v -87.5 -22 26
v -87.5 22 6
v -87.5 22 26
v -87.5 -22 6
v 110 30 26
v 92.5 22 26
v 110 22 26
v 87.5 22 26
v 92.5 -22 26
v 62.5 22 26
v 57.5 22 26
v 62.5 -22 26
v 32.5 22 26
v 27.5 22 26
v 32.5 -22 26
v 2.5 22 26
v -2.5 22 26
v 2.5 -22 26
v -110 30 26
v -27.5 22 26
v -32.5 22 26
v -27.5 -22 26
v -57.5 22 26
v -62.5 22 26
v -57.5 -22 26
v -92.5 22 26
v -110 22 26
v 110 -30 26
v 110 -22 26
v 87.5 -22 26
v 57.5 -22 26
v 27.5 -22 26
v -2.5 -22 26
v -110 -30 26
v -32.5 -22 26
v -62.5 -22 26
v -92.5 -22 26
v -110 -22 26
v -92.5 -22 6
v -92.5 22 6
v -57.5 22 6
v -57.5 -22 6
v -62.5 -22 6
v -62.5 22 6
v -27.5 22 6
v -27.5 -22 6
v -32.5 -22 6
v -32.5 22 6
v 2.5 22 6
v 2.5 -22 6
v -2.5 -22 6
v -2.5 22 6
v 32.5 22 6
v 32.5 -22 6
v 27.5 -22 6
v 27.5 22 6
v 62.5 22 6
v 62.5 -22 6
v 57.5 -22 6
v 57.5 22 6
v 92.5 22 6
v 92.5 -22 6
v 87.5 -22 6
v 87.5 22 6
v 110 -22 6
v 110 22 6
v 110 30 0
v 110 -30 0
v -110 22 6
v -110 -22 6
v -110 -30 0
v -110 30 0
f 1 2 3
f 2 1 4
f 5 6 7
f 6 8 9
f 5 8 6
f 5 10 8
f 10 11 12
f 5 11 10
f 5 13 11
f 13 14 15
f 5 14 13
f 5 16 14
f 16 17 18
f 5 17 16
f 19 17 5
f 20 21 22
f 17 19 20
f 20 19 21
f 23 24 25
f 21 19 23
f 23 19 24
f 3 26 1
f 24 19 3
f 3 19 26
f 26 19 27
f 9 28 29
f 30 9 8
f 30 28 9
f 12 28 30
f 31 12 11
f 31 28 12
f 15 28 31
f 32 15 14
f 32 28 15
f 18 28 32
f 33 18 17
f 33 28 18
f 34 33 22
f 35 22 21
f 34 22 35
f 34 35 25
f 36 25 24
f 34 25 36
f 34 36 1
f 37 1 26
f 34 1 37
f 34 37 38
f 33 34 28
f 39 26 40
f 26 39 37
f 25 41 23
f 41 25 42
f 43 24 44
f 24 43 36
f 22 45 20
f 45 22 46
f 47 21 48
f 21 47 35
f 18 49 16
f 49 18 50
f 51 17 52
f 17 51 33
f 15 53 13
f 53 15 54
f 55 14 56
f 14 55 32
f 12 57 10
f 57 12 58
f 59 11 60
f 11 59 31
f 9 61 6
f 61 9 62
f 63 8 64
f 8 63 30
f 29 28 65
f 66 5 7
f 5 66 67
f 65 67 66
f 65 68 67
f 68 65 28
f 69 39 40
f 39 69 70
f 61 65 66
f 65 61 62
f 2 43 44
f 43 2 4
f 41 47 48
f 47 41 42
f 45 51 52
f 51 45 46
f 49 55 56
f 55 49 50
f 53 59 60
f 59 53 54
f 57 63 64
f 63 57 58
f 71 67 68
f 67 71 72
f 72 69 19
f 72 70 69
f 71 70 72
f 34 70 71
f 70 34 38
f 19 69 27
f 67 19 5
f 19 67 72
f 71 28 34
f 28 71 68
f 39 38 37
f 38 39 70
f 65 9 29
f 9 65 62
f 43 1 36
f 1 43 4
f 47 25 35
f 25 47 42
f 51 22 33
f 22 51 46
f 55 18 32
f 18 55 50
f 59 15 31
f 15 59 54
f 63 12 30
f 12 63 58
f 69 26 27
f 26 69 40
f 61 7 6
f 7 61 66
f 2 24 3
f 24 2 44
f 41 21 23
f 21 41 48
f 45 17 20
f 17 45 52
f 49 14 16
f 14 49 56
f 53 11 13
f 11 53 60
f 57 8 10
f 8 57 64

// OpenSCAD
$fn = 32;

// ----------------------------------------------------------------------
// Rib frame 220 x 60 x 26
// 7 ribs at 30 mm pitch
// ----------------------------------------------------------------------

// --- parameters (mm) ---
frame = [220, 60, 6];  // base plate size (x, y, z)
rail_w = 8;            // side rail width
ribs = 7;              // number of ribs
rib_t = 5;             // rib thickness
rib_h = 20;            // rib height above the base plate
pitch = 30;            // pitch between rib centres

// --- derived feature positions (mm) ---
span = (ribs - 1) * pitch;          // = 180   distance between the outer ribs
origin_x = -span / 2;               // = -90   X of the first rib
rib_len = frame[1] - 2 * rail_w + 2;  // = 46   rib length, 1 mm into each rail
feature_centers = [
  [origin_x + 0 * pitch, 0],
  [origin_x + 1 * pitch, 0],
  [origin_x + 2 * pitch, 0],
  [origin_x + 3 * pitch, 0],
  [origin_x + 4 * pitch, 0],
  [origin_x + 5 * pitch, 0],
  [origin_x + 6 * pitch, 0]
];   // rib centre line, drives the rib loop

// base plate, two side rails, then the ribs read straight off feature_centers
union() {
  translate([-frame[0] / 2, -frame[1] / 2, 0]) cube(frame);
  translate([-frame[0] / 2, -frame[1] / 2, 0]) cube([frame[0], rail_w, frame[2] + rib_h]);
  translate([-frame[0] / 2, frame[1] / 2 - rail_w, 0]) cube([frame[0], rail_w, frame[2] + rib_h]);
  for (centre = feature_centers)
    translate([centre[0] - rib_t / 2, centre[1] - rib_len / 2, frame[2] - 1])
      cube([rib_t, rib_len, rib_h + 1]);
}
